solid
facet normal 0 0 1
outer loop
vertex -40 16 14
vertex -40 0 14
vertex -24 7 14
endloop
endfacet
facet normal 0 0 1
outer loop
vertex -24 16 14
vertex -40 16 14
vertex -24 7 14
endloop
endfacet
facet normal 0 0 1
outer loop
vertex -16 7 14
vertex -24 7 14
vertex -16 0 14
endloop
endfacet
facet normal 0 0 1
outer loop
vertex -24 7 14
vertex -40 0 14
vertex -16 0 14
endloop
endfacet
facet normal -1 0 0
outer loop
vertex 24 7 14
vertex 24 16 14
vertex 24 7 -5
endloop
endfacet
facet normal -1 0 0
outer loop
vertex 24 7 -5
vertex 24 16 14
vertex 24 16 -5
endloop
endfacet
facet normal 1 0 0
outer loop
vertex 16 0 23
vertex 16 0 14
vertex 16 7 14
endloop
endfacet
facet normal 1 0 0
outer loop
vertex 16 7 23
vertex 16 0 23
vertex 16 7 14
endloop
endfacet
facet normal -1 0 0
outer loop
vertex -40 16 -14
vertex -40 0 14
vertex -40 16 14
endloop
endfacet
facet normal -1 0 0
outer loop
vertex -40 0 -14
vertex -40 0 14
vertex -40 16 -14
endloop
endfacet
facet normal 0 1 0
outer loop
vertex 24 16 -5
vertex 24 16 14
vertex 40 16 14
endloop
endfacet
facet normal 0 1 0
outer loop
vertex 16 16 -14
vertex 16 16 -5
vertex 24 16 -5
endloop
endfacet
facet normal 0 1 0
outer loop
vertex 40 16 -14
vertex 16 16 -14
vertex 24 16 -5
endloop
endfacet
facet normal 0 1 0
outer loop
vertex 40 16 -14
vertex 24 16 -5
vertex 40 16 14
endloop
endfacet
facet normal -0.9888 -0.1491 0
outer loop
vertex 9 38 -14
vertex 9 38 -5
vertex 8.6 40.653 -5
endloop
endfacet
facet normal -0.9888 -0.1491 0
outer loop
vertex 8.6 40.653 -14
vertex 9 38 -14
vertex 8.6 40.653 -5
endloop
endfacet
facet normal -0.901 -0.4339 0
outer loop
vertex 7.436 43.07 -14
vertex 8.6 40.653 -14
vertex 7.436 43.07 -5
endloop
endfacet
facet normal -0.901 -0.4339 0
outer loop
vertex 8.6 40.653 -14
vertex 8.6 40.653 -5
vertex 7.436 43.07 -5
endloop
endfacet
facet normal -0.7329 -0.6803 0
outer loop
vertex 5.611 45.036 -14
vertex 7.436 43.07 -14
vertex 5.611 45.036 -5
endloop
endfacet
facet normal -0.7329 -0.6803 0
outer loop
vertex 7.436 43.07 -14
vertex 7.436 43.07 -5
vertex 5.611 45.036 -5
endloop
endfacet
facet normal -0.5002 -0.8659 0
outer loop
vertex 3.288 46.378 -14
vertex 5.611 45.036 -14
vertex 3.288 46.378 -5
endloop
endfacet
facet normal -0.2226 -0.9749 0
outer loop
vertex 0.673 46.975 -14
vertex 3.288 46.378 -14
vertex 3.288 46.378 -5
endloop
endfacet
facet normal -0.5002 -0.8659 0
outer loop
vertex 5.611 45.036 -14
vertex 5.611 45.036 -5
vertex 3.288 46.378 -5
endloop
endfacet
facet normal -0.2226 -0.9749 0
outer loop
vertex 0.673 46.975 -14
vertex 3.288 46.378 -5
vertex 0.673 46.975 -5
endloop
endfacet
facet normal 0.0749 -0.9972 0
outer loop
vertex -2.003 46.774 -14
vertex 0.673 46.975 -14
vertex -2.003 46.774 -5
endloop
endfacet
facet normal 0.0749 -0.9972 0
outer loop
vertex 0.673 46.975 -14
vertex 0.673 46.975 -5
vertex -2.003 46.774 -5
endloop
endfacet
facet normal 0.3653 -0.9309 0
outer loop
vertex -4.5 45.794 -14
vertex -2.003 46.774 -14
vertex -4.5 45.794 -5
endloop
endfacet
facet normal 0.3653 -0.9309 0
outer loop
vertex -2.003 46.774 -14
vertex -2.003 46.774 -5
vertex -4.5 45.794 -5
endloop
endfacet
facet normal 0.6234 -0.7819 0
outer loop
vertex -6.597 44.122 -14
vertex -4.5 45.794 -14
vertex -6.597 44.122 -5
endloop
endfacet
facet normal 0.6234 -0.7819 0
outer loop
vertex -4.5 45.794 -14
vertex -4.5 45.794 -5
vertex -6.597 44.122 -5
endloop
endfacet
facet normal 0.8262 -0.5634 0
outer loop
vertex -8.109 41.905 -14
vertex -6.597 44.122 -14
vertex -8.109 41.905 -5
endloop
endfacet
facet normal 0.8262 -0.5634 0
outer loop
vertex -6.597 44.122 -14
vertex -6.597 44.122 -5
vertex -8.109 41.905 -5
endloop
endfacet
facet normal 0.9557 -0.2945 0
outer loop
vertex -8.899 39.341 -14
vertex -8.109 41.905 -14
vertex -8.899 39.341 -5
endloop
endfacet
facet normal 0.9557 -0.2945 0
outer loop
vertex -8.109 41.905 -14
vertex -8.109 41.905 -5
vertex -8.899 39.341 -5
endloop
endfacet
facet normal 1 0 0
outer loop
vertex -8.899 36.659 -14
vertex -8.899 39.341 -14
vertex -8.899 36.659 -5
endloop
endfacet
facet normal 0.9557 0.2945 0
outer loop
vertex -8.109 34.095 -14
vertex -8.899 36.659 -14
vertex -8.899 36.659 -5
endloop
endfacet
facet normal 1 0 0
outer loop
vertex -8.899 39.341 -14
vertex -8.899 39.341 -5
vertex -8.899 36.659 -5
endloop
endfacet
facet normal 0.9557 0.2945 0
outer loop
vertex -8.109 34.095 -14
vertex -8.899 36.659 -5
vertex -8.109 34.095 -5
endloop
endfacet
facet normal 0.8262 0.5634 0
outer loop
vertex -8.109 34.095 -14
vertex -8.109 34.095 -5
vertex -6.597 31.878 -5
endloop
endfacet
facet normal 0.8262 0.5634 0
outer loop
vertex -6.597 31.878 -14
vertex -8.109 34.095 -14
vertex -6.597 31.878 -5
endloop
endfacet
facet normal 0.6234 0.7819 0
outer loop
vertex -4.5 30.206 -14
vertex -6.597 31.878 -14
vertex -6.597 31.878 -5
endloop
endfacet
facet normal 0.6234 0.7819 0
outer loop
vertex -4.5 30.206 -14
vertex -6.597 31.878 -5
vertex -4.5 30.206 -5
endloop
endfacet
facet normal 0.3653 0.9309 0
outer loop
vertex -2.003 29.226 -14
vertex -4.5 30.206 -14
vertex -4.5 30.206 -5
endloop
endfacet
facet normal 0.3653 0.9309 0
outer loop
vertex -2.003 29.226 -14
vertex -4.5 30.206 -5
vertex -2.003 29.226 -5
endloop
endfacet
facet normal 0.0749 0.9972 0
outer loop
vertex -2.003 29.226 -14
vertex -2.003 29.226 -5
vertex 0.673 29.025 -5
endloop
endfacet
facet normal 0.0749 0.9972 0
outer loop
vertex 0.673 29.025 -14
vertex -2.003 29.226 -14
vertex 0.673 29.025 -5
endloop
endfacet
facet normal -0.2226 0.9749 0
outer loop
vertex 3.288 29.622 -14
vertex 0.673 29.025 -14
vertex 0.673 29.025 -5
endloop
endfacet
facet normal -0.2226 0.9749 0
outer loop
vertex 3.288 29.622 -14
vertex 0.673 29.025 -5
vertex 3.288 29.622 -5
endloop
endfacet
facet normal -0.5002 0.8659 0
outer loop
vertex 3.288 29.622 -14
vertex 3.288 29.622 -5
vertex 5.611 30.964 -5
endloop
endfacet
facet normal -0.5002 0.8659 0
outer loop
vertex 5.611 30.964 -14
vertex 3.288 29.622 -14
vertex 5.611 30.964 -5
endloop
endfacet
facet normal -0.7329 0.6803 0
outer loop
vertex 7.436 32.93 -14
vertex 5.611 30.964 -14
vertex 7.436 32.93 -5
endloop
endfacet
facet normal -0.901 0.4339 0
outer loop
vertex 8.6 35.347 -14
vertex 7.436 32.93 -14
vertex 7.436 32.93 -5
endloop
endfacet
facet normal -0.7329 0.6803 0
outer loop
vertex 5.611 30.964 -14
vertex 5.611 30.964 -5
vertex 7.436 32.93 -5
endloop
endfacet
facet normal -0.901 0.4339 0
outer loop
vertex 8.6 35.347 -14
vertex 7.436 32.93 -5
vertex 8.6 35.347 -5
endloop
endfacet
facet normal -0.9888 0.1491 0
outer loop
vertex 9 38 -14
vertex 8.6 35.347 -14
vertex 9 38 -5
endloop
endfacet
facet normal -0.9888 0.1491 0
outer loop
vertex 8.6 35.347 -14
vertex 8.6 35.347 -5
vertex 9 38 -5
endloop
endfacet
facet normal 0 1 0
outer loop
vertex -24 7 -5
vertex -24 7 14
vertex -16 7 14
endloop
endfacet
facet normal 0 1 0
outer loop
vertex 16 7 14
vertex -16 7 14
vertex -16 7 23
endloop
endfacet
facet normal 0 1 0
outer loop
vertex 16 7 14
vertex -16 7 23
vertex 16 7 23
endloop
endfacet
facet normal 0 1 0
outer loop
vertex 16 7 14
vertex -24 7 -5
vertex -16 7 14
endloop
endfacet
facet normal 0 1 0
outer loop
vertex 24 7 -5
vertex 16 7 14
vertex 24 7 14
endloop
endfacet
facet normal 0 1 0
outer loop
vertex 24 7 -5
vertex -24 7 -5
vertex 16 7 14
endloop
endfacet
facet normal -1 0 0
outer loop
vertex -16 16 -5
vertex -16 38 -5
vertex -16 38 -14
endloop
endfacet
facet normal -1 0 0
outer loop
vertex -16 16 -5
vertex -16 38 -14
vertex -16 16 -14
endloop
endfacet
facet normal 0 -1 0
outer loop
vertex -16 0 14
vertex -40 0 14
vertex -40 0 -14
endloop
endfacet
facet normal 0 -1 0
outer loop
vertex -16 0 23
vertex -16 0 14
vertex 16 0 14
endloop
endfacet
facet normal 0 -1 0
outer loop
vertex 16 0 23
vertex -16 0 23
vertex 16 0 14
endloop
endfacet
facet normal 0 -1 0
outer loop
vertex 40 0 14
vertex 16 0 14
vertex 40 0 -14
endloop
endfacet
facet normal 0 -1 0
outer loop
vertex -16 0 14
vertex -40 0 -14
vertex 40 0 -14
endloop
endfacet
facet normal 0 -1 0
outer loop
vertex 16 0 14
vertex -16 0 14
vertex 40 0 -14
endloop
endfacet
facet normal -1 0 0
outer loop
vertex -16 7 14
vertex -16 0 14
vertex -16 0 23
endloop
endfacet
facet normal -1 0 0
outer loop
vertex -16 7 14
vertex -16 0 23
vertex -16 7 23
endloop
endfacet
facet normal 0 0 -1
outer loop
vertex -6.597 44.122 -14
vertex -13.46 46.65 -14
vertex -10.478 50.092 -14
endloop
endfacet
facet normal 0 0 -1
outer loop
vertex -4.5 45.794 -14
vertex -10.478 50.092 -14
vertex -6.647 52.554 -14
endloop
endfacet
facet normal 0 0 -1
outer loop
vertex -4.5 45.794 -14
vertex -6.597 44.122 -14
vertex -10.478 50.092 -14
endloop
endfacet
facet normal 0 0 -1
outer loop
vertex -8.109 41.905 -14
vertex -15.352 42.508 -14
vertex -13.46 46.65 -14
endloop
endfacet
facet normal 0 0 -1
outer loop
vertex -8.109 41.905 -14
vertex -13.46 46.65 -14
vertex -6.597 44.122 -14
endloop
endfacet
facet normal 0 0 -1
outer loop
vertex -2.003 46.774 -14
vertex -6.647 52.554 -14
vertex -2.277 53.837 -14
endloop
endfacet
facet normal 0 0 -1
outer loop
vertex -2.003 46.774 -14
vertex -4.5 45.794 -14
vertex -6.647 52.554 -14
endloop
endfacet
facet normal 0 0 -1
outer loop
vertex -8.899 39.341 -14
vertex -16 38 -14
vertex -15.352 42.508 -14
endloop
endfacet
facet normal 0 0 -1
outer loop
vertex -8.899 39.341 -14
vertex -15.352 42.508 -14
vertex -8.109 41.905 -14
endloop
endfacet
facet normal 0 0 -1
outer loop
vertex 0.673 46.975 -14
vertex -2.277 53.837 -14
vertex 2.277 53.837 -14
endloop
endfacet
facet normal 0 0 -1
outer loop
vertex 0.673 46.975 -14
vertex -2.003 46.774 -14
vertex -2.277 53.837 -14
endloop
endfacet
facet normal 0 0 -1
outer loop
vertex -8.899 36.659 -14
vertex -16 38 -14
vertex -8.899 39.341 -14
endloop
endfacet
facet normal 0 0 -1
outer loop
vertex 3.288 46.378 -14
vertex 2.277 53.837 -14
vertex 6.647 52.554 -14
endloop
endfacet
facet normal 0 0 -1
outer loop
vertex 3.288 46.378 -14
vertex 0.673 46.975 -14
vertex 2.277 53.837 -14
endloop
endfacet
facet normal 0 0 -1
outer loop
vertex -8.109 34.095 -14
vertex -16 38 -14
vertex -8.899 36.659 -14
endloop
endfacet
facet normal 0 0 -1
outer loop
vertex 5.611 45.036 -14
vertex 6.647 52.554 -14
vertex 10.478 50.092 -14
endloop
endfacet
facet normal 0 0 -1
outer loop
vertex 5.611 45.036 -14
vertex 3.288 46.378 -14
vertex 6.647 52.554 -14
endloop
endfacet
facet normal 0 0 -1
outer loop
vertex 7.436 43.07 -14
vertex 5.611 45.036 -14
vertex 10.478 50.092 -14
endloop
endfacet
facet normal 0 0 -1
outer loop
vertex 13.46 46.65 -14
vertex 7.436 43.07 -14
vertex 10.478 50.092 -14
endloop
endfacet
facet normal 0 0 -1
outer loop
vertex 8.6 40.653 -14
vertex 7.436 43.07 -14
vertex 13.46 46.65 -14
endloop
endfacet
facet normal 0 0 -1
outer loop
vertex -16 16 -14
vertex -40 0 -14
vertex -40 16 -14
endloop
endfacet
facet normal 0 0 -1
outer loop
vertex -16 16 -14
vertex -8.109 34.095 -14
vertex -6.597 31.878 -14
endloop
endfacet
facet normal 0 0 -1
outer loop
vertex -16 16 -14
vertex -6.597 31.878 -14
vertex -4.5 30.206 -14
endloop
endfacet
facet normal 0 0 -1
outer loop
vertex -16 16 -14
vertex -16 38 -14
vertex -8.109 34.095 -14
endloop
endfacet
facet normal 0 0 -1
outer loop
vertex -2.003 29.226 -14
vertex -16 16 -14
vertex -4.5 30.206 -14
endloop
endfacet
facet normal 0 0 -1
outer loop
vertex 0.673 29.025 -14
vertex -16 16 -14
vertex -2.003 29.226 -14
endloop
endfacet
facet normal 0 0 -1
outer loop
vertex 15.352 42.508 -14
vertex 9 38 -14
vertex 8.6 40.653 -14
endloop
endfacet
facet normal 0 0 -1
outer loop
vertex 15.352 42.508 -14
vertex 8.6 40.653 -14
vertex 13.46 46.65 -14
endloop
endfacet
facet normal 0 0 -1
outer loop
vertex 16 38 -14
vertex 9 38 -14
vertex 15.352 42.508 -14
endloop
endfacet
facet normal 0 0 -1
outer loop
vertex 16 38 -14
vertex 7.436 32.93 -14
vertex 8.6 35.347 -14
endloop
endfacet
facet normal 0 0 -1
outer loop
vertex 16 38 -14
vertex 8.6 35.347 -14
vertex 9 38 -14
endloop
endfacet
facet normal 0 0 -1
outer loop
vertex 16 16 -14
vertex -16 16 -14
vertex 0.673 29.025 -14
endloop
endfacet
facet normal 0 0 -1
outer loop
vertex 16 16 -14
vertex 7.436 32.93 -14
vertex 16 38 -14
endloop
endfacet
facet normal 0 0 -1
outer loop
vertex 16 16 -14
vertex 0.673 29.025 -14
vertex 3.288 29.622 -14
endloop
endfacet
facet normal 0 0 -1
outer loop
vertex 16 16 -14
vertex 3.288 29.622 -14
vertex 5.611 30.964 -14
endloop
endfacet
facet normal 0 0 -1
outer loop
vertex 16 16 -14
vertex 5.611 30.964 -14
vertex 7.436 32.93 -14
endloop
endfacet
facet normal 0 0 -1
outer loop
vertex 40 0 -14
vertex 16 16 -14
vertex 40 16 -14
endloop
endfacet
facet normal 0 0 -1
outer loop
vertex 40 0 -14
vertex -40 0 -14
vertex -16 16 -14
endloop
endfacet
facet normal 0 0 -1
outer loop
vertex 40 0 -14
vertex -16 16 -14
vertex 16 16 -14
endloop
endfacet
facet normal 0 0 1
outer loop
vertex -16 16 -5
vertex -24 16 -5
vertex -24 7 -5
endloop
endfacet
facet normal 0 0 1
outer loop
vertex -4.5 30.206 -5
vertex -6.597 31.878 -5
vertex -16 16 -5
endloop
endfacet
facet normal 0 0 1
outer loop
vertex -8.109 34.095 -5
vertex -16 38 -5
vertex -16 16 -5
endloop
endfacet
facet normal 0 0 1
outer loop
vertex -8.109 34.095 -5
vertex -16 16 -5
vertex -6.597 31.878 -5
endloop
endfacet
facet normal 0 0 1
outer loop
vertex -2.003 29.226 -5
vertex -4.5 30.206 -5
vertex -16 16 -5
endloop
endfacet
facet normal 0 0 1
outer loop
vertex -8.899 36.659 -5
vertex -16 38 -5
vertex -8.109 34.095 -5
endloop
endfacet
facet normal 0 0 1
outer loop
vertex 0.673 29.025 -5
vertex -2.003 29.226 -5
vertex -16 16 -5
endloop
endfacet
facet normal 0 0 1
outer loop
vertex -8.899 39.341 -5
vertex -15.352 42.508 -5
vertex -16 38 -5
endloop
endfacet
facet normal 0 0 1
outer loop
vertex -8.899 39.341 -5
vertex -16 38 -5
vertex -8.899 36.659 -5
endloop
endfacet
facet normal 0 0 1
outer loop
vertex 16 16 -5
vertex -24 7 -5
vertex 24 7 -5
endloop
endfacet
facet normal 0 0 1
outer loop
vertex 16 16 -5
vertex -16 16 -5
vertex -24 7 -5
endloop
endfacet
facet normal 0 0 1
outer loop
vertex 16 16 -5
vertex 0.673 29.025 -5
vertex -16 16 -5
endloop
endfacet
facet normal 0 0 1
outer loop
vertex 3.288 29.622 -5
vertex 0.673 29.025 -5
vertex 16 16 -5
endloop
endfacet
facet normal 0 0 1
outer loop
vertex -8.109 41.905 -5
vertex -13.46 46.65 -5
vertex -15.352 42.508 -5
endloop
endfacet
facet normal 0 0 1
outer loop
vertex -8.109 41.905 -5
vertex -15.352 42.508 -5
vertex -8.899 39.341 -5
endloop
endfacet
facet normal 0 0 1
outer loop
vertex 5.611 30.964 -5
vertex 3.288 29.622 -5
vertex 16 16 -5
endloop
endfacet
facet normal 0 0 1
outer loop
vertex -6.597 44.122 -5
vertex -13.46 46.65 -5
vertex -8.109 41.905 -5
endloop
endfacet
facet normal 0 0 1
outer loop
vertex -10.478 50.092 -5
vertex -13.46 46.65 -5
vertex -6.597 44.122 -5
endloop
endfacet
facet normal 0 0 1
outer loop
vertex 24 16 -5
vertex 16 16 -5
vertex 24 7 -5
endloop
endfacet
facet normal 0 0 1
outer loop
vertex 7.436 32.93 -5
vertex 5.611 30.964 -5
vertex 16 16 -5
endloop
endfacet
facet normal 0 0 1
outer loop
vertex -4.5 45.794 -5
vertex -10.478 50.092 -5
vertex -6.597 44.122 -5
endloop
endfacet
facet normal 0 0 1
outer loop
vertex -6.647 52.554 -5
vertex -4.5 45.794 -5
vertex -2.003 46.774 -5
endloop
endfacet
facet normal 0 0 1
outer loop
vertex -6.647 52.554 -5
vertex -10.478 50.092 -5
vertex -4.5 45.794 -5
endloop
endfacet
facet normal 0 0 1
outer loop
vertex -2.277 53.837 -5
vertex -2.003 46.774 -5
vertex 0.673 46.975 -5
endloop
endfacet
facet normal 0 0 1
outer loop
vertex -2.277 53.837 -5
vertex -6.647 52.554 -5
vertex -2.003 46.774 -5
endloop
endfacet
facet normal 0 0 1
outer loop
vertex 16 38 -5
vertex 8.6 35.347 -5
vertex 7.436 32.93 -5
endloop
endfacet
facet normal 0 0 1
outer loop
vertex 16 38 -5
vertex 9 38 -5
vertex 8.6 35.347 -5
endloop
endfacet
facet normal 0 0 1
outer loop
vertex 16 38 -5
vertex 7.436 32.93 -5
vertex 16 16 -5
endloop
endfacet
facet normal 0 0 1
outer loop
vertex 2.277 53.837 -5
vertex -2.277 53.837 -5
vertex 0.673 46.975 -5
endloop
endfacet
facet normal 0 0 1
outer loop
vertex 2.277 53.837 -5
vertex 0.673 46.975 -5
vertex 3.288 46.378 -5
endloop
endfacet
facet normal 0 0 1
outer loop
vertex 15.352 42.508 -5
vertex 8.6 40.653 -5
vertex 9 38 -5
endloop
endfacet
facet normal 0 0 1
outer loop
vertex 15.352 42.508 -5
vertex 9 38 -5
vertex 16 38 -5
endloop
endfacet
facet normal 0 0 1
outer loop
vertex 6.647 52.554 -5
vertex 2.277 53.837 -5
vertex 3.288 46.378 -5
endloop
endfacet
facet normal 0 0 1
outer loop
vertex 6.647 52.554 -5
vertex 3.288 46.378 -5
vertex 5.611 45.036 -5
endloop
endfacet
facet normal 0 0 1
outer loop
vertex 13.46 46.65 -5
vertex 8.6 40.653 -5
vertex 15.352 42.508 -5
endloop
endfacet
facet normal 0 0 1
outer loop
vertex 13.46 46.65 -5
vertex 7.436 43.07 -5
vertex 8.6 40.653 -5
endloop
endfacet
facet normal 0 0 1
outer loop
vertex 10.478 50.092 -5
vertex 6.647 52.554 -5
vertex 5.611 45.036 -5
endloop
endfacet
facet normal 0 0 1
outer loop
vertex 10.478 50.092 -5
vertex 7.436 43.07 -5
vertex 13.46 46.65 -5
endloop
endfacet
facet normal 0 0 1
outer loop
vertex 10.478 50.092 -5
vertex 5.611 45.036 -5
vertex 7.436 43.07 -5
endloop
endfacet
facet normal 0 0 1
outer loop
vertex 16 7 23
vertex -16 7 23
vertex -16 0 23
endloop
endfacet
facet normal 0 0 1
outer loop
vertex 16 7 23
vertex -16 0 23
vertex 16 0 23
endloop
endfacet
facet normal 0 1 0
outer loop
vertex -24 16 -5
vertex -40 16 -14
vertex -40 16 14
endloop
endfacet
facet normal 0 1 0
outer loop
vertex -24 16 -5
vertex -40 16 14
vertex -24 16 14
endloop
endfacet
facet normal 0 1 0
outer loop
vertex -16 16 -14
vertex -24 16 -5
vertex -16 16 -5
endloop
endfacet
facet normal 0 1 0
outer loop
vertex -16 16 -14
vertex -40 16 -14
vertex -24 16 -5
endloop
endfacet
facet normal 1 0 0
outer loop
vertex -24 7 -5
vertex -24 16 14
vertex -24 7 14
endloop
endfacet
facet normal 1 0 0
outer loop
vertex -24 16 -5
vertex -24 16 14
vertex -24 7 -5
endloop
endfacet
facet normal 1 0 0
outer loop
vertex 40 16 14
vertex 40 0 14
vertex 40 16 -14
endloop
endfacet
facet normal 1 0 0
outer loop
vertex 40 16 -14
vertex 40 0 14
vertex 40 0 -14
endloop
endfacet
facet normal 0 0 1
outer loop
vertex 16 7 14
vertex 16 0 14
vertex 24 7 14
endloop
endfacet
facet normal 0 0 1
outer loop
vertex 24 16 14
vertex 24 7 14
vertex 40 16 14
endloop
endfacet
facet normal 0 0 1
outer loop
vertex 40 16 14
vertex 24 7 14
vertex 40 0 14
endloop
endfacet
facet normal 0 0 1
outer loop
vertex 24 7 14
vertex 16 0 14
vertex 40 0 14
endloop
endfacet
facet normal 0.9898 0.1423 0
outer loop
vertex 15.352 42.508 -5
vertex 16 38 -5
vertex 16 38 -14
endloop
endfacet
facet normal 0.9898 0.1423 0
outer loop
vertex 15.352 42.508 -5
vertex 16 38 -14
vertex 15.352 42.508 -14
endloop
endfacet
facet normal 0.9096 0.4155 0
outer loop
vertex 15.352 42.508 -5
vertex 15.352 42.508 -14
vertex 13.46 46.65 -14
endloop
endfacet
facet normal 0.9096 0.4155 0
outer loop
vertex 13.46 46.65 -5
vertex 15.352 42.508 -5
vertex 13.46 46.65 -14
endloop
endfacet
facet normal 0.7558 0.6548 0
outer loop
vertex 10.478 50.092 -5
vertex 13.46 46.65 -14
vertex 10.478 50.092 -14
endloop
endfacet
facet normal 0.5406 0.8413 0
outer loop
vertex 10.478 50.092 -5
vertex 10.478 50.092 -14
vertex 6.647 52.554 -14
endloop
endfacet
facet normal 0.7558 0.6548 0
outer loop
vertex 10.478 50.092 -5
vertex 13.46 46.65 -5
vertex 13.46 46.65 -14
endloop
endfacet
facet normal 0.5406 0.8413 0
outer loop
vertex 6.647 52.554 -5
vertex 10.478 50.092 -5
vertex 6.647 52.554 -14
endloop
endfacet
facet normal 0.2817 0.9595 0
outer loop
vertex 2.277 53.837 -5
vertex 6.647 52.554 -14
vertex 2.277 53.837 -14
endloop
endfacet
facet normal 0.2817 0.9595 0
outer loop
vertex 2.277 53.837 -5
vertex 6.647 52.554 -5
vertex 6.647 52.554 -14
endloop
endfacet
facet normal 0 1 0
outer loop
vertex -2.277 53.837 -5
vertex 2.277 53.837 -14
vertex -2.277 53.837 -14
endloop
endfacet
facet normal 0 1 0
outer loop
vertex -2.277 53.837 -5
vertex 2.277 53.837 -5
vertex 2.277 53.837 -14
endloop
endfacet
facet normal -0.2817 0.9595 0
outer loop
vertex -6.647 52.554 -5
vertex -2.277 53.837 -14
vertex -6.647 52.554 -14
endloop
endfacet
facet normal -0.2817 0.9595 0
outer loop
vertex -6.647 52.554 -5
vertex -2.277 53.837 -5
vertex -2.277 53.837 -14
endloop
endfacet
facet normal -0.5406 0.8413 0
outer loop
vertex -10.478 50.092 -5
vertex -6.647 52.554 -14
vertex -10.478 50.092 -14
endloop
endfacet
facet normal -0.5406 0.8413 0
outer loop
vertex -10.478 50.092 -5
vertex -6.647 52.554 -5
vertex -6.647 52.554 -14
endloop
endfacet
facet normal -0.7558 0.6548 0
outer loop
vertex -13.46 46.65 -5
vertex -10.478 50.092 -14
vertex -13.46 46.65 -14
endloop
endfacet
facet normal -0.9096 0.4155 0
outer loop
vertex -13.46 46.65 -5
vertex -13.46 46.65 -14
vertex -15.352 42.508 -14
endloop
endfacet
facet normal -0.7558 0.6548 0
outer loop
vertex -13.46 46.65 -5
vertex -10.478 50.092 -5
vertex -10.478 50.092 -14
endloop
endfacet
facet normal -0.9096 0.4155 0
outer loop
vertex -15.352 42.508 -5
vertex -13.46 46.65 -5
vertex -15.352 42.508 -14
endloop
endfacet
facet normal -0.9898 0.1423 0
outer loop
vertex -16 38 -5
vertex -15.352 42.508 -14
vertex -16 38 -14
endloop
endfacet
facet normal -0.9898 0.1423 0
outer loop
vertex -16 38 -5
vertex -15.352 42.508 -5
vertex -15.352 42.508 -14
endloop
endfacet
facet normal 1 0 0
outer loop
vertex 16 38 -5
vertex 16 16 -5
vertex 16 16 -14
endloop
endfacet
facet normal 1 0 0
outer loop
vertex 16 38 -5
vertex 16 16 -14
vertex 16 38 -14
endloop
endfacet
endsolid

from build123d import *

# Parameters (mm, degrees)
SKETCH_1_W          = 80
SKETCH_1_H          = 28
EXTRUDE_1_DEPTH     = 16
SKETCH_2_W          = 48
SKETCH_2_H          = 19
CUT_EXTRUDE_1_DEPTH = 9
SKETCH_3_W          = 32
SKETCH_3_H          = 7
EXTRUDE_2_DEPTH     = 9
SKETCH_4_R          = 9
EXTRUDE_3_DEPTH     = 9


with BuildPart() as part:
    # 草图1 → 凸台-拉伸1 (new body)
    with BuildSketch(Plane(origin=(0, 0, 0), x_dir=(1, 0, 0), z_dir=(0, 1, 0))):
        Rectangle(SKETCH_1_W, SKETCH_1_H)
    extrude(amount=EXTRUDE_1_DEPTH)

    # 草图2 → 切除-拉伸1 (cut)
    with BuildSketch(Plane(origin=(0, 16, 0), x_dir=(1, 0, 0), z_dir=(0, 1, 0))):
        with Locations((0, -4.5)):
            Rectangle(SKETCH_2_W, SKETCH_2_H)
    extrude(amount=-CUT_EXTRUDE_1_DEPTH, mode=Mode.SUBTRACT)

    # 草图3 → 凸台-拉伸2 (add)
    with BuildSketch(Plane.XY.offset(14)):
        with Locations((0, 3.5)):
            Rectangle(SKETCH_3_W, SKETCH_3_H)
    extrude(amount=EXTRUDE_2_DEPTH)

    # 草图4 → 凸台-拉伸3 (add)
    with BuildSketch(Plane.XY.offset(-5)):
        with BuildLine():
            Line((-16, 16), (16, 16))
            Line((16, 16), (16, 38))
            ThreePointArc((16, 38), (0, 54), (-16, 38))
            Line((-16, 38), (-16, 16))
        make_face()
        with Locations((0, 38)):
            Circle(SKETCH_4_R, mode=Mode.SUBTRACT)
    extrude(amount=-EXTRUDE_3_DEPTH)


solid = part.part
